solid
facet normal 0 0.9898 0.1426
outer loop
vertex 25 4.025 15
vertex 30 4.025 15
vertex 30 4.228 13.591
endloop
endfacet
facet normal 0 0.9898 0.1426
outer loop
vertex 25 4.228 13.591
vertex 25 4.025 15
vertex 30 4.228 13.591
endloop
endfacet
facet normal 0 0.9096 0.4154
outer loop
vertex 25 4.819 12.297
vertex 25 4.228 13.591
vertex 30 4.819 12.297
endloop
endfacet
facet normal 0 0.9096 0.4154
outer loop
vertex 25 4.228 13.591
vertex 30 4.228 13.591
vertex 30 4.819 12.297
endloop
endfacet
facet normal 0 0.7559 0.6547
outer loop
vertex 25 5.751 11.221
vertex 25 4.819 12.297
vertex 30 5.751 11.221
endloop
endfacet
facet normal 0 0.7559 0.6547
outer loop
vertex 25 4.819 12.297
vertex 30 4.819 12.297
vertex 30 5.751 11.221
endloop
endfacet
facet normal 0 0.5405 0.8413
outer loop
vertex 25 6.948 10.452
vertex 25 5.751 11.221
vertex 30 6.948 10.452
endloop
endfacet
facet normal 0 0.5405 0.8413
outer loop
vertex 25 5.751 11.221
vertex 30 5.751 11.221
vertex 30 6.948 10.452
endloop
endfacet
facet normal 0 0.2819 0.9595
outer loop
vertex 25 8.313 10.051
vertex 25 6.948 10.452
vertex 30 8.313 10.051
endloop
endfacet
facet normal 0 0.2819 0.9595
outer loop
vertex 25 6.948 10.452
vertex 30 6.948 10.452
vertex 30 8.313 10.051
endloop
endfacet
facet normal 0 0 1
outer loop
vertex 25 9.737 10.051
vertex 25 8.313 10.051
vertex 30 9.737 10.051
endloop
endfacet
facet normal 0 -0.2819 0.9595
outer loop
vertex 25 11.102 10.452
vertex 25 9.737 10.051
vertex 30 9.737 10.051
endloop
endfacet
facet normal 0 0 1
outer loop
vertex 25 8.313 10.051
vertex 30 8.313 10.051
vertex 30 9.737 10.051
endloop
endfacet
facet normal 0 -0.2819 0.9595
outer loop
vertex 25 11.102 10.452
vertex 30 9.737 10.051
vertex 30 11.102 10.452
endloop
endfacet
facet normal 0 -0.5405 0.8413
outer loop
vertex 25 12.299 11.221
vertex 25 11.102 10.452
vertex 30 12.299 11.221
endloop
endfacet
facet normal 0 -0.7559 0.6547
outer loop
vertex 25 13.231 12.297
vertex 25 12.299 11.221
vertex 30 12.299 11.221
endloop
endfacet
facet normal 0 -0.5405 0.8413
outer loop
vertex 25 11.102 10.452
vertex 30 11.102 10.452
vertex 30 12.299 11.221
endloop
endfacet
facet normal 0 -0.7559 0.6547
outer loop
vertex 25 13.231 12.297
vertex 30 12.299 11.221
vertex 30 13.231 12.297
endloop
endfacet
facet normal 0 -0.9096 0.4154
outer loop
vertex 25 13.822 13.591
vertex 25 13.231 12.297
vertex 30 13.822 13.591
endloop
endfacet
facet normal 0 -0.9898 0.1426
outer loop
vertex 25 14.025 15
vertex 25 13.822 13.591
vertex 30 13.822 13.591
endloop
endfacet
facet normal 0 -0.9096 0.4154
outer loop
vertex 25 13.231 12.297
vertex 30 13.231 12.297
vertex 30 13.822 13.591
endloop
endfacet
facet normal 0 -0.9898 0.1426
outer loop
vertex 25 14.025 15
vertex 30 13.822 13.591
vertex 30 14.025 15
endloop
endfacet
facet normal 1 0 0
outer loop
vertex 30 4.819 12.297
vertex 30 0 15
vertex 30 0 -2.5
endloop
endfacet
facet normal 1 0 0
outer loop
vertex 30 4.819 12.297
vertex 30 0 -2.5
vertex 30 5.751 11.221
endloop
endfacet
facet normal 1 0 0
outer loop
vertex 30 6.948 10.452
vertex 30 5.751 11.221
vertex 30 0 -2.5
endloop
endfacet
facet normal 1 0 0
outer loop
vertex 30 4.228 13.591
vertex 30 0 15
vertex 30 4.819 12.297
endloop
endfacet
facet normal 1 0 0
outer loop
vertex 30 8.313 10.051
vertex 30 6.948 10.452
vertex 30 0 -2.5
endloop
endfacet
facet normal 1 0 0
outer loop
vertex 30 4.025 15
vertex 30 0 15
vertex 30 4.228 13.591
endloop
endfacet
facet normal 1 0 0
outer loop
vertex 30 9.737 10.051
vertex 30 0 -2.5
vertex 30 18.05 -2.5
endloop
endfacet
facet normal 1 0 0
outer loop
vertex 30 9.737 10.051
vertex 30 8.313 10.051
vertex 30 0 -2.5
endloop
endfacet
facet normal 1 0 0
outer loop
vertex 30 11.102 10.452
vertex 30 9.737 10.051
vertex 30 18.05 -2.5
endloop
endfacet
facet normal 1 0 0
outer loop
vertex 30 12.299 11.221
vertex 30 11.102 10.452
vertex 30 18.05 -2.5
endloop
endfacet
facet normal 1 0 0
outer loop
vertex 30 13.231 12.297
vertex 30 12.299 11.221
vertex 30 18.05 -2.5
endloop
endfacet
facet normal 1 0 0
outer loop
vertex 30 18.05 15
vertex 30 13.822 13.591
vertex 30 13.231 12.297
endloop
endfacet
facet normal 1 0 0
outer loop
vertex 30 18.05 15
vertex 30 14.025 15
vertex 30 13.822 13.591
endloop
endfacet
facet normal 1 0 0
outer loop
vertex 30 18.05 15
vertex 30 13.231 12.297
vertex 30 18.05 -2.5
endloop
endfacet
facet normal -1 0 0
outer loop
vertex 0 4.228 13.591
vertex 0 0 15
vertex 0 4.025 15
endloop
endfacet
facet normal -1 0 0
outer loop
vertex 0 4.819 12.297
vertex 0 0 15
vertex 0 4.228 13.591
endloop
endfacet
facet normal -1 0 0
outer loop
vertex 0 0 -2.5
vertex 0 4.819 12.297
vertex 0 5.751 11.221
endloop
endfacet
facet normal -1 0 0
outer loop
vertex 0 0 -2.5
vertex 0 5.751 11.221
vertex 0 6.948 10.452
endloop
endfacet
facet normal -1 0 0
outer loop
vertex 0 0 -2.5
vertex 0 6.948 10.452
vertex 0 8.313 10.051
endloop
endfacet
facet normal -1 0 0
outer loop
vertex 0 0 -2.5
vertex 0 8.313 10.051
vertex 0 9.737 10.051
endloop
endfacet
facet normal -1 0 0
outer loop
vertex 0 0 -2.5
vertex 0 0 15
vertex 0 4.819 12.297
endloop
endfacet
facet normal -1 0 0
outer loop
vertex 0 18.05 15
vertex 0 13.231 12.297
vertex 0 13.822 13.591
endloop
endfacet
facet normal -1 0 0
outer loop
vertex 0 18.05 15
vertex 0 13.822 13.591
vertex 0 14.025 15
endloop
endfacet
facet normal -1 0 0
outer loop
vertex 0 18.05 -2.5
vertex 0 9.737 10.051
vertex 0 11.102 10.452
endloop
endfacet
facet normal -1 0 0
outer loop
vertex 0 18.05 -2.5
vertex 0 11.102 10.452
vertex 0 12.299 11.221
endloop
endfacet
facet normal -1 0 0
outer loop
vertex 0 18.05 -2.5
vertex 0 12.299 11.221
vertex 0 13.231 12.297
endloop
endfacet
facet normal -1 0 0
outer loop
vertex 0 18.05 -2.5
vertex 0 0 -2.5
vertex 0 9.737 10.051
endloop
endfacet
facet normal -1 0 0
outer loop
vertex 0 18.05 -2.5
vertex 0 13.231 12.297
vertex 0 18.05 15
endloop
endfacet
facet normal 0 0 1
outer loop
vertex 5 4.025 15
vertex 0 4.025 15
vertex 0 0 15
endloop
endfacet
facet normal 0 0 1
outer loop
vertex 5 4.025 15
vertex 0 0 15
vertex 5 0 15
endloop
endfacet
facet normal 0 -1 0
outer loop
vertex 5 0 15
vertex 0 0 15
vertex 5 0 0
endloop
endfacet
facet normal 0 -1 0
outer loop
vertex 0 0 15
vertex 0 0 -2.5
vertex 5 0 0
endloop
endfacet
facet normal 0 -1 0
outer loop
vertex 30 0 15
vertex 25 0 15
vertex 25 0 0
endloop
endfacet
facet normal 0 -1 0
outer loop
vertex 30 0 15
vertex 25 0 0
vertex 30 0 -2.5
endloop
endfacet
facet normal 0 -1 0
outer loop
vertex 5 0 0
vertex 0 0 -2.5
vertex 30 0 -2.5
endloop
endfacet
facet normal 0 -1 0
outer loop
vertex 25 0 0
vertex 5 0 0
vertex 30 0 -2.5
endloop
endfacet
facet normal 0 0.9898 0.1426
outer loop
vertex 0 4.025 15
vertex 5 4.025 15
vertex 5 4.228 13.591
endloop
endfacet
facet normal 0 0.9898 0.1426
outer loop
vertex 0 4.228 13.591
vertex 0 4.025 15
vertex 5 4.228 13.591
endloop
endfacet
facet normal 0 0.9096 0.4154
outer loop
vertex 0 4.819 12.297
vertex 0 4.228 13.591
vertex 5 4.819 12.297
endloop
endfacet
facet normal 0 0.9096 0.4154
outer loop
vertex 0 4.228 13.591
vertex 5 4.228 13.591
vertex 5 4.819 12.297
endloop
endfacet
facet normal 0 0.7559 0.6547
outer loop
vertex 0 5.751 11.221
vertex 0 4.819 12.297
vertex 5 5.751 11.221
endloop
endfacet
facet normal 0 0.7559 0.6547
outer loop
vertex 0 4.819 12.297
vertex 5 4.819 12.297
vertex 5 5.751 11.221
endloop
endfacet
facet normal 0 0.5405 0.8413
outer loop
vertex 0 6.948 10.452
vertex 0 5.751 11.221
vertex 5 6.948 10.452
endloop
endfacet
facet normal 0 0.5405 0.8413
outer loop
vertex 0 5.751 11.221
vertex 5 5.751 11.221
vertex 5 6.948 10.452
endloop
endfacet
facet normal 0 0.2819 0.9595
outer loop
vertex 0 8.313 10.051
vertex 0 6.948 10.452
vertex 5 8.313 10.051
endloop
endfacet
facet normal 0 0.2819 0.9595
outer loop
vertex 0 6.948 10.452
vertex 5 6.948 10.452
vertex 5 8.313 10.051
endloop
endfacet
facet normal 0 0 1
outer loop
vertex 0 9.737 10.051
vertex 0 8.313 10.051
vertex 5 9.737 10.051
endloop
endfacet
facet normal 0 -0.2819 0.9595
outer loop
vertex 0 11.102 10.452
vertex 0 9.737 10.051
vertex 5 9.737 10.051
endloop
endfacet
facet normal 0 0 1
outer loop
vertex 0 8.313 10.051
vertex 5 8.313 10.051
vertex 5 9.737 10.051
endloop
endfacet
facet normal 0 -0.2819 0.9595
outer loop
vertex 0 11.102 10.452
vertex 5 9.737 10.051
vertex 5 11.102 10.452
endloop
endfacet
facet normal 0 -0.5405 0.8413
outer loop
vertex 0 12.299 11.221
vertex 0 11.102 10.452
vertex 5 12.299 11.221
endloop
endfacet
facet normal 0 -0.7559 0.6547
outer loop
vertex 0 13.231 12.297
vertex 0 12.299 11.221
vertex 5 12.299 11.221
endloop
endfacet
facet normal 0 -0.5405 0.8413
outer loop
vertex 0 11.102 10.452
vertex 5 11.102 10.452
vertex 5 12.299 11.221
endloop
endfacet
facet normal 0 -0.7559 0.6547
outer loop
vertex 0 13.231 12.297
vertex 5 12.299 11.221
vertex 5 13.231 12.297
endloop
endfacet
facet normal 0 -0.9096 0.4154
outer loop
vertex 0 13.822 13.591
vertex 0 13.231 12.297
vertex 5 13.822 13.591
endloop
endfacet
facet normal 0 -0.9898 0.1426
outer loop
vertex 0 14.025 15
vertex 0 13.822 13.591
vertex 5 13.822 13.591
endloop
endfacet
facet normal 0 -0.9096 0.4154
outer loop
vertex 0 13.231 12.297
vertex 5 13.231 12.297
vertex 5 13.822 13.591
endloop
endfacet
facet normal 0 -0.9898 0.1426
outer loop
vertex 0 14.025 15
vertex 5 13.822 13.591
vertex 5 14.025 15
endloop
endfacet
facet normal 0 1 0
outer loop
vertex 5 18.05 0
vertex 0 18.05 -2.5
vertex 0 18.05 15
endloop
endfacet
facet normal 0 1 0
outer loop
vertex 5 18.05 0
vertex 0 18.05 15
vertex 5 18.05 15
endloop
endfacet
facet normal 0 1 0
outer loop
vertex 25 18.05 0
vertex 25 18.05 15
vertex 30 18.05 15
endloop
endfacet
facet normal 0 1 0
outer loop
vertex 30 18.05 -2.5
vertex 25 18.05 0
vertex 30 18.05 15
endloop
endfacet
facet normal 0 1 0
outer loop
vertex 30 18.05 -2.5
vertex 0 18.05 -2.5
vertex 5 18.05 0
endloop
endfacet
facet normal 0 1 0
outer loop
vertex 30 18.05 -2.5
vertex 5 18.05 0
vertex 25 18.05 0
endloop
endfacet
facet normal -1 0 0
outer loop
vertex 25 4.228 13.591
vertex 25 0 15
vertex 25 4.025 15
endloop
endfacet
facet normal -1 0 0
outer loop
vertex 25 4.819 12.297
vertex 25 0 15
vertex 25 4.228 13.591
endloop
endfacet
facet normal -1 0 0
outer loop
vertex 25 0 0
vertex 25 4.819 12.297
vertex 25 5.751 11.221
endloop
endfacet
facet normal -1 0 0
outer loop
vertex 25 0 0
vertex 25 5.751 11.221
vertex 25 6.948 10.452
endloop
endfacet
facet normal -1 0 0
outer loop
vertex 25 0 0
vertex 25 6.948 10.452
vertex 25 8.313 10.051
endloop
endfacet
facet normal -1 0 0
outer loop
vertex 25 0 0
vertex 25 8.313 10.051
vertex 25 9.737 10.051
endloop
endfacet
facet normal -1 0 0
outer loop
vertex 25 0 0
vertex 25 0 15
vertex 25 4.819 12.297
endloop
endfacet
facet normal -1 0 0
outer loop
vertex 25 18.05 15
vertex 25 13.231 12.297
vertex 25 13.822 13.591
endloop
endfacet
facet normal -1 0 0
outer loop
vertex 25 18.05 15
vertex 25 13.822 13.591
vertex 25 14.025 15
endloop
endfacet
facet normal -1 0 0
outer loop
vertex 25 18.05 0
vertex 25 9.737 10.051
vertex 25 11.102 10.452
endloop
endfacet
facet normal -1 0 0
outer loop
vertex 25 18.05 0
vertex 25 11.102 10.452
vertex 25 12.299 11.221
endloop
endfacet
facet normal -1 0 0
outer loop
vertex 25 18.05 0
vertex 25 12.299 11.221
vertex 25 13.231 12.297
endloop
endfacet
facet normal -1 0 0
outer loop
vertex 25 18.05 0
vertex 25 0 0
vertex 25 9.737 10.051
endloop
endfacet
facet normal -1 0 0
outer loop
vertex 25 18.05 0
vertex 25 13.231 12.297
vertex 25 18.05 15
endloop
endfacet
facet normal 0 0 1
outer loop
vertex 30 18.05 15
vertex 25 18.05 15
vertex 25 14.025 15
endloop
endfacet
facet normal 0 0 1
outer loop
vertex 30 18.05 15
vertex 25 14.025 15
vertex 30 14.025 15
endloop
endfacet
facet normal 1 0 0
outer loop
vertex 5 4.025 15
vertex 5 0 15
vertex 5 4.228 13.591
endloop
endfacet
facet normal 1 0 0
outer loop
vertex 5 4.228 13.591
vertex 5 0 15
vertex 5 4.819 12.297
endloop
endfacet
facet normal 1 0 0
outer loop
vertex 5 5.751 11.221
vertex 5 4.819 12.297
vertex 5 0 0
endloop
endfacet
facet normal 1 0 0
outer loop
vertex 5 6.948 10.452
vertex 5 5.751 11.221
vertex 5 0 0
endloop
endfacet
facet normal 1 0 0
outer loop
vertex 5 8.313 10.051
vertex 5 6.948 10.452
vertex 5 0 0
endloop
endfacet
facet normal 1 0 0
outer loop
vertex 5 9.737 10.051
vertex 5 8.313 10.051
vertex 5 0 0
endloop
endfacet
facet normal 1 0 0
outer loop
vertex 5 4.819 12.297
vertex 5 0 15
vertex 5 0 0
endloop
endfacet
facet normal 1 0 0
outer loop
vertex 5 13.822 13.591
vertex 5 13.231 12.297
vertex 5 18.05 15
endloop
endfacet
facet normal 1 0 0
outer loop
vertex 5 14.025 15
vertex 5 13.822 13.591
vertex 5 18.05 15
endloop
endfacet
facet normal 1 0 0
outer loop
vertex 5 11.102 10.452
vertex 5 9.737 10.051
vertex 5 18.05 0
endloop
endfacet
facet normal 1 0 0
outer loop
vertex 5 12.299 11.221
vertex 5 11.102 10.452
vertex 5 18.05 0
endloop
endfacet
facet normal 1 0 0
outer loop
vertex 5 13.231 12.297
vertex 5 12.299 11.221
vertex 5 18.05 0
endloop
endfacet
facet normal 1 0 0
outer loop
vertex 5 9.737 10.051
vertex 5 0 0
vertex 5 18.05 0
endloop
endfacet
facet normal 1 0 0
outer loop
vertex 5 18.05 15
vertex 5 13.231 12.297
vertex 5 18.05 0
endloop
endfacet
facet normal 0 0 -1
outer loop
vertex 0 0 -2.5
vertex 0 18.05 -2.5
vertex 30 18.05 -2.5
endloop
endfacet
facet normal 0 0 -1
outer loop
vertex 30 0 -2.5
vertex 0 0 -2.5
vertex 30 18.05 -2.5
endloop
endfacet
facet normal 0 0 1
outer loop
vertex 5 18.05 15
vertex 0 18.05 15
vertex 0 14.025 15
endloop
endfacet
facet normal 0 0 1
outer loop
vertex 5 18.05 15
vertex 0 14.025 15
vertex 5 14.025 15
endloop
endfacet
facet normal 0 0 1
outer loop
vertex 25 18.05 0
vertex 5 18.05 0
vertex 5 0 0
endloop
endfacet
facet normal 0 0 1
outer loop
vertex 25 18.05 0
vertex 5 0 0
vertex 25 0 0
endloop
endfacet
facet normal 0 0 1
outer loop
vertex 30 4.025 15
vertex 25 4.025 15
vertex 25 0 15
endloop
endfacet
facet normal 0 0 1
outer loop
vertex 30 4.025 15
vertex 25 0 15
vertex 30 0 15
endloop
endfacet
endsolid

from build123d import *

# Parameters (mm, degrees)
F0_W     = 5
F0_H     = 18.05
F0_W_2   = 20
F1_DEPTH = 2.5
F2_DEPTH = 15
F4_DEPTH = 30.001


with BuildPart() as f1:
    # F0 (on Top) → F1 (new body)
    with BuildSketch(Plane.XY):
        with Locations((2.5, 9.025)):
            Rectangle(F0_W, F0_H)
        with Locations((15, 9.025)):
            Rectangle(F0_W_2, F0_H)
        with Locations((27.5, 9.025)):
            Rectangle(F0_W, F0_H)
    extrude(amount=-F1_DEPTH)

    # F0 (on Top) → F2 (join)
    with BuildSketch(Plane.XY):
        with Locations((2.5, 9.025)):
            Rectangle(F0_W, F0_H)
        with Locations((27.5, 9.025)):
            Rectangle(F0_W, F0_H)
    extrude(amount=F2_DEPTH)

    # F3 (on face) → F4 (cut, through all)
    with BuildSketch(Plane.YZ.offset(30)):
        with BuildLine():
            ThreePointArc((4.025, 15), (9.025, 10), (14.025, 15))
            Line((14.025, 15), (4.025, 15))
        make_face()
        with BuildLine():
            Line((4.025, 15), (14.025, 15))
            ThreePointArc((14.025, 15), (9.025, 20), (4.025, 15))
        make_face()
    extrude(amount=-F4_DEPTH, mode=Mode.SUBTRACT)


solid = f1.part
